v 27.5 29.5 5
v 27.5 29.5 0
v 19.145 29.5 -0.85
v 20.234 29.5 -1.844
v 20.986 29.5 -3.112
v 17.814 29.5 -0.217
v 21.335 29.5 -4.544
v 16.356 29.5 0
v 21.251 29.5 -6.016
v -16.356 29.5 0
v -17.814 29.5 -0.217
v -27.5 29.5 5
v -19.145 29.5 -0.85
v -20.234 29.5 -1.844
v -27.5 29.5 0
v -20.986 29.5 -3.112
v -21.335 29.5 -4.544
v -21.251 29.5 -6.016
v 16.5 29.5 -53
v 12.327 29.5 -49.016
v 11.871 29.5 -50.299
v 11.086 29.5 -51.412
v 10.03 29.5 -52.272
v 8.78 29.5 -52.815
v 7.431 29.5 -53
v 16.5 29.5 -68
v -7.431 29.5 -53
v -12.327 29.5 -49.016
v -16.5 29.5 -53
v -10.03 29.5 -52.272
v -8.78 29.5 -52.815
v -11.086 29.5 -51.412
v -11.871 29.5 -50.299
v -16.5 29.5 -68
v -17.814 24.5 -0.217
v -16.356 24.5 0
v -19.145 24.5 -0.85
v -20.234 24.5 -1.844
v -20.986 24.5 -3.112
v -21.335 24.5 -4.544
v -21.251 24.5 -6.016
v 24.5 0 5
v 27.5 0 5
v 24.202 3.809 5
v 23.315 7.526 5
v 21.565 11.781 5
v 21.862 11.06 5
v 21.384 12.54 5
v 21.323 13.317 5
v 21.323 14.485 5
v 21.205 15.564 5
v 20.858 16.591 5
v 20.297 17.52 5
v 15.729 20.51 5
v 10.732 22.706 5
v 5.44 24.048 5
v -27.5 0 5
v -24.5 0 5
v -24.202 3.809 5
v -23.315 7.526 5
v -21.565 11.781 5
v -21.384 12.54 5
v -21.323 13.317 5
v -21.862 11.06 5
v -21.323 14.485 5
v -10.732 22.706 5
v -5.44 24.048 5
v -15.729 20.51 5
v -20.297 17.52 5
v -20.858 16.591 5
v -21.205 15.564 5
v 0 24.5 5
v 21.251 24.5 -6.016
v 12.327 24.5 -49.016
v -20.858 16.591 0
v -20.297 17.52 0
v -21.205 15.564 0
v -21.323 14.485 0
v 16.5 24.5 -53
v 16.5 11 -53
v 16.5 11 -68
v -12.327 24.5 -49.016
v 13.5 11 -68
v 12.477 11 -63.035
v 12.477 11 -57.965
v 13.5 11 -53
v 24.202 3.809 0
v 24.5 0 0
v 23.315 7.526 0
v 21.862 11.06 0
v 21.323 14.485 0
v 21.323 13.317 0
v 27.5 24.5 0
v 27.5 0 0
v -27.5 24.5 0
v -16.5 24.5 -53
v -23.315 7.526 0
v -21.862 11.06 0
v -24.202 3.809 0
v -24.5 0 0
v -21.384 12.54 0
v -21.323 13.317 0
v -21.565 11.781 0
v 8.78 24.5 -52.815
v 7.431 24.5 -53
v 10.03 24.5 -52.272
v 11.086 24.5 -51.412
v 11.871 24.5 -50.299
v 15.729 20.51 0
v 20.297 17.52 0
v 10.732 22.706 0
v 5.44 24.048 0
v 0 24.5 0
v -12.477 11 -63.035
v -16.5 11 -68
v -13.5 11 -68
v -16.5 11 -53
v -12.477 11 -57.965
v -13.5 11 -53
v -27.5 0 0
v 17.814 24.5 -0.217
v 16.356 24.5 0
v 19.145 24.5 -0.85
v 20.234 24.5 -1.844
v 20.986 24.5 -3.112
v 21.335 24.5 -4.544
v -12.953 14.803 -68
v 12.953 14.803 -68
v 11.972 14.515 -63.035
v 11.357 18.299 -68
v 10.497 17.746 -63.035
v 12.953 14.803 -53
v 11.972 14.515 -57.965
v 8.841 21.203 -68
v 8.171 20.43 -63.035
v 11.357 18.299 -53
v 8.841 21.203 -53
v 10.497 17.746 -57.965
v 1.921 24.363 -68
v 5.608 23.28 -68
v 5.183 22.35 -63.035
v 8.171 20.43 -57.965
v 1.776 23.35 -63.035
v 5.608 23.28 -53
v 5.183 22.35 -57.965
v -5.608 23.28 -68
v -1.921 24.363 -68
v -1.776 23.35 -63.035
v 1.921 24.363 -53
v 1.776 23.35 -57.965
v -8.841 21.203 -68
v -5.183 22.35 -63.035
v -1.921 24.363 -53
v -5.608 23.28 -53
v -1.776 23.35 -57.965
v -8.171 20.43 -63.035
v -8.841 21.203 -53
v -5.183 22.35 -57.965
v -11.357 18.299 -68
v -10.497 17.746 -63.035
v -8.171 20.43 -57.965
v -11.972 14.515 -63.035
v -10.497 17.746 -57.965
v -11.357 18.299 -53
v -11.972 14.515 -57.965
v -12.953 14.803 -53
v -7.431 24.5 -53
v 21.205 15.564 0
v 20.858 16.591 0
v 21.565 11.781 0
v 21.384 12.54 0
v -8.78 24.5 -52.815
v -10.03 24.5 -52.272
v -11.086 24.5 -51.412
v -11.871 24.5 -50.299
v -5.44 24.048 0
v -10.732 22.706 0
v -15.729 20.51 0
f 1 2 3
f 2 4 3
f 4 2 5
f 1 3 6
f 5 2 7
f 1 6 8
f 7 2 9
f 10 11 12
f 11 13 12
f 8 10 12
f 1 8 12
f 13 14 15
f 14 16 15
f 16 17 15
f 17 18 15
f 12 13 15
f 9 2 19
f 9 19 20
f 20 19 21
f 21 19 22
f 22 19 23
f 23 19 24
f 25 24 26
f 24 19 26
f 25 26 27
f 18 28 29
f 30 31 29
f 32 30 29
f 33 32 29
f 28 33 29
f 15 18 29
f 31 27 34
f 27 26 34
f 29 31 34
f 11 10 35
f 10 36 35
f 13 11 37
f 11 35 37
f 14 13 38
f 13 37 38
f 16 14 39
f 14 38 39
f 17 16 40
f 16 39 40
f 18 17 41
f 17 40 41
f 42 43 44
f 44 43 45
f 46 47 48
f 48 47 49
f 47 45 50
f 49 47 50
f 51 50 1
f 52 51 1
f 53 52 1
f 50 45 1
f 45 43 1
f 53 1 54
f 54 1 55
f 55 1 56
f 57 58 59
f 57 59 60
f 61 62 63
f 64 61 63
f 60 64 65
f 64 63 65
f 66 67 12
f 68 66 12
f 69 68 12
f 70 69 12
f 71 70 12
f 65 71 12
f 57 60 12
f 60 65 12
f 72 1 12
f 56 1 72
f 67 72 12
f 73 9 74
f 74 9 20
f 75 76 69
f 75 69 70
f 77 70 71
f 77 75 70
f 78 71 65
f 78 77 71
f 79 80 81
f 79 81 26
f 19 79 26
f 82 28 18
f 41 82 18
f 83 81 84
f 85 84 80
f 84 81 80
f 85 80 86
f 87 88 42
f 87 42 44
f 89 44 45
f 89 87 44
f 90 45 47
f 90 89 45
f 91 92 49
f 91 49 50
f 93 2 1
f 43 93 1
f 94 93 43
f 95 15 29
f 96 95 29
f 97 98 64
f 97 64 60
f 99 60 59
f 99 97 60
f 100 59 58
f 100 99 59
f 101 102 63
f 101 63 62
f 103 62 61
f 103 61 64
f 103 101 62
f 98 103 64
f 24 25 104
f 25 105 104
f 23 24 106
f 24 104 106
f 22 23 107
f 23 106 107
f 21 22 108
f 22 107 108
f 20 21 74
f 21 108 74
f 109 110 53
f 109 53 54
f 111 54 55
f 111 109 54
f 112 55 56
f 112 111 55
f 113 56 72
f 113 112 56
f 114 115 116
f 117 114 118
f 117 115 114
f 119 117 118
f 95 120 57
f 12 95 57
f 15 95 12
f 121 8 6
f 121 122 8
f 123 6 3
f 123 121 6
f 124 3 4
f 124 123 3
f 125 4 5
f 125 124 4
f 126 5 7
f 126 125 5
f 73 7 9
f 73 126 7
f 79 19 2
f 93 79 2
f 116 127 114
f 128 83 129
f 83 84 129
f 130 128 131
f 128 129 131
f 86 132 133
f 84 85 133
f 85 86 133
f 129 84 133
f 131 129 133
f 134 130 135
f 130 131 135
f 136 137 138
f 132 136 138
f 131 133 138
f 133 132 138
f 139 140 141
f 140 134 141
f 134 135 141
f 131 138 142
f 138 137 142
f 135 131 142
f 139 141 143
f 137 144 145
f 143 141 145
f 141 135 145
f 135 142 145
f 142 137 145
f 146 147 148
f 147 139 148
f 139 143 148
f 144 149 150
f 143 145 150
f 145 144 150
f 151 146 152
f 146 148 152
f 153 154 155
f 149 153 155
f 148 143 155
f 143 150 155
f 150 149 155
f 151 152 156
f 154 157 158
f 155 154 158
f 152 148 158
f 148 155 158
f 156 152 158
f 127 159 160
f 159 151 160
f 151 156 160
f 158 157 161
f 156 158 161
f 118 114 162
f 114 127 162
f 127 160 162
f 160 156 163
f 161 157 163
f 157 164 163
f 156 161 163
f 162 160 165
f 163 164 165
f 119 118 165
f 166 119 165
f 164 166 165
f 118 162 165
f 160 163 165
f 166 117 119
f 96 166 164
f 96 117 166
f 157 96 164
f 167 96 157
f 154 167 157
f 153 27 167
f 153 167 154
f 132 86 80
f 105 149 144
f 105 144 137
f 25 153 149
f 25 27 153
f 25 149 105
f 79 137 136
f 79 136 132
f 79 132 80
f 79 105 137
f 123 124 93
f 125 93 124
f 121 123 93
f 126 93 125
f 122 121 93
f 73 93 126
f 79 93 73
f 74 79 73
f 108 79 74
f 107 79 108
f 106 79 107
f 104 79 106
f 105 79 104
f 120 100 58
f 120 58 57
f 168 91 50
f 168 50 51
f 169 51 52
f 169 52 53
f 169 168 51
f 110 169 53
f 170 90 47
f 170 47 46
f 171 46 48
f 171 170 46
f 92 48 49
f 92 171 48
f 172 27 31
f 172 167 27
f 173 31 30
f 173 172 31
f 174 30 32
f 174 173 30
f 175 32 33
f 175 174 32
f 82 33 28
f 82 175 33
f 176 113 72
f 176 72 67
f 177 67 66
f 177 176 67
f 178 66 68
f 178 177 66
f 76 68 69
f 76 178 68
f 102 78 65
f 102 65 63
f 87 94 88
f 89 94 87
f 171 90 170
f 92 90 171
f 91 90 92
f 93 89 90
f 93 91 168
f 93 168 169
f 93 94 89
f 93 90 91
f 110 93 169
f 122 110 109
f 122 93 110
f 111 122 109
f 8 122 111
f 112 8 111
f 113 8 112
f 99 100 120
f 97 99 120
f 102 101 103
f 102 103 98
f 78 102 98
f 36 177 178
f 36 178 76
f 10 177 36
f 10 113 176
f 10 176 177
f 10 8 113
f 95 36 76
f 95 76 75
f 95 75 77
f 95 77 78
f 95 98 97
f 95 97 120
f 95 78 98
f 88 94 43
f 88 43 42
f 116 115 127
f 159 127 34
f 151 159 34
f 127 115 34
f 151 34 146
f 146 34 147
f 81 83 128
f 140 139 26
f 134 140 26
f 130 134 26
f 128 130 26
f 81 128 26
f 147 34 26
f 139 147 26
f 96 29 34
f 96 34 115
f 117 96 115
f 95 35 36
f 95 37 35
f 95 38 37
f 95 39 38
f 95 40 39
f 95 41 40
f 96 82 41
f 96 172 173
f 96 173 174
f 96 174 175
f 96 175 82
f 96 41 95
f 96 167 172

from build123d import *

# Parameters (mm, degrees)
BOSS_EXTRUDE1_DEPTH = 5
BOSS_EXTRUDE2_START = -53
BOSS_EXTRUDE2_DEPTH = 15
REVOLVE2_ANGLE      = 180
BOSS_EXTRUDE3_DEPTH = 5
FILLET1_R           = 5


with BuildPart() as part:
    # Sketch1 → Boss-Extrude1 (new body)
    with BuildSketch(Plane.XY):
        with BuildLine():
            Line((-21.323076923, 14.485250559), (-21.323076923, 13.317117605))
            ThreePointArc((-21.323076923, 13.317117605), (-21.459554932, 12.156878903), (-21.861538462, 11.059979028))
            ThreePointArc((-21.861538462, 11.059979028), (-23.831257754, 5.685169641), (-24.5, 0))
            Line((-24.5, 0), (-27.5, 0))
            Line((-27.5, 0), (-27.5, 29.5))
            Line((-27.5, 29.5), (27.5, 29.5))
            Line((27.5, 29.5), (27.5, 0))
            Line((27.5, 0), (24.5, 0))
            ThreePointArc((24.5, 0), (23.831257754, 5.685169641), (21.861538462, 11.059979028))
            ThreePointArc((21.861538462, 11.059979028), (21.459554932, 12.156878903), (21.323076923, 13.317117605))
            Line((21.323076923, 13.317117605), (21.323076923, 14.485250559))
            ThreePointArc((21.323076923, 14.485250559), (21.059553746, 16.08705807), (20.296762002, 17.52002022))
            ThreePointArc((20.296762002, 17.52002022), (10.731713115, 22.70625472), (0, 24.5))
            ThreePointArc((0, 24.5), (-10.731713115, 22.70625472), (-20.296762002, 17.52002022))
            ThreePointArc((-20.296762002, 17.52002022), (-21.059553746, 16.08705807), (-21.323076923, 14.485250559))
        make_face()
    extrude(amount=BOSS_EXTRUDE1_DEPTH)



with BuildPart() as body_2:
    # Sketch2 → Boss-Extrude2 (new body)
    with BuildSketch(Plane.XY.offset(BOSS_EXTRUDE2_START)):
        with BuildLine():
            Line((-16.5, 11), (-13.5, 11))
            ThreePointArc((-13.5, 11), (0, 24.5), (13.5, 11))
            Line((13.5, 11), (16.5, 11))
            Line((16.5, 11), (16.5, 29.5))
            Line((16.5, 29.5), (-16.5, 29.5))
            Line((-16.5, 29.5), (-16.5, 11))
        make_face()
    extrude(amount=-BOSS_EXTRUDE2_DEPTH)

    # Sketch5 → Revolve2 (revolve)
    with BuildSketch(Plane.XZ.offset(-11)):
        with BuildLine():
            Line((13.5, -53), (13.5, -68))
            ThreePointArc((13.5, -68), (12.348480035, -60.5), (13.5, -53))
        make_face()
    revolve(axis=Axis((0, 11, -60.5), (0, 0, 1)), revolution_arc=REVOLVE2_ANGLE)


with BuildPart() as part_1:
    add(part.part)

    add(body_2.part)  # Boss-Extrude3 merges body 2
    # Sketch6 → Boss-Extrude3 (add)
    with BuildSketch(Plane(origin=(0, 29.5, 0), x_dir=(1, 0, 0), z_dir=(0, 1, 0))):
        Polygon((-27.5, 0), (-16.5, 53), (-11.5, 53), (-22.5, 0), align=None)
        Polygon((22.5, 0), (11.5, 53), (16.5, 53), (27.5, 0), align=None)
    extrude(amount=-BOSS_EXTRUDE3_DEPTH)

    # Fillet1
    fillet1_edges = [part_1.edges().sort_by_distance(p)[0] for p in [
        (-22.5, 27, 0),
        (-11.5, 27, -53),
        (22.5, 27, 0),
        (11.5, 27, -53),
    ]]
    fillet(fillet1_edges, radius=FILLET1_R)


solid = part_1.part
